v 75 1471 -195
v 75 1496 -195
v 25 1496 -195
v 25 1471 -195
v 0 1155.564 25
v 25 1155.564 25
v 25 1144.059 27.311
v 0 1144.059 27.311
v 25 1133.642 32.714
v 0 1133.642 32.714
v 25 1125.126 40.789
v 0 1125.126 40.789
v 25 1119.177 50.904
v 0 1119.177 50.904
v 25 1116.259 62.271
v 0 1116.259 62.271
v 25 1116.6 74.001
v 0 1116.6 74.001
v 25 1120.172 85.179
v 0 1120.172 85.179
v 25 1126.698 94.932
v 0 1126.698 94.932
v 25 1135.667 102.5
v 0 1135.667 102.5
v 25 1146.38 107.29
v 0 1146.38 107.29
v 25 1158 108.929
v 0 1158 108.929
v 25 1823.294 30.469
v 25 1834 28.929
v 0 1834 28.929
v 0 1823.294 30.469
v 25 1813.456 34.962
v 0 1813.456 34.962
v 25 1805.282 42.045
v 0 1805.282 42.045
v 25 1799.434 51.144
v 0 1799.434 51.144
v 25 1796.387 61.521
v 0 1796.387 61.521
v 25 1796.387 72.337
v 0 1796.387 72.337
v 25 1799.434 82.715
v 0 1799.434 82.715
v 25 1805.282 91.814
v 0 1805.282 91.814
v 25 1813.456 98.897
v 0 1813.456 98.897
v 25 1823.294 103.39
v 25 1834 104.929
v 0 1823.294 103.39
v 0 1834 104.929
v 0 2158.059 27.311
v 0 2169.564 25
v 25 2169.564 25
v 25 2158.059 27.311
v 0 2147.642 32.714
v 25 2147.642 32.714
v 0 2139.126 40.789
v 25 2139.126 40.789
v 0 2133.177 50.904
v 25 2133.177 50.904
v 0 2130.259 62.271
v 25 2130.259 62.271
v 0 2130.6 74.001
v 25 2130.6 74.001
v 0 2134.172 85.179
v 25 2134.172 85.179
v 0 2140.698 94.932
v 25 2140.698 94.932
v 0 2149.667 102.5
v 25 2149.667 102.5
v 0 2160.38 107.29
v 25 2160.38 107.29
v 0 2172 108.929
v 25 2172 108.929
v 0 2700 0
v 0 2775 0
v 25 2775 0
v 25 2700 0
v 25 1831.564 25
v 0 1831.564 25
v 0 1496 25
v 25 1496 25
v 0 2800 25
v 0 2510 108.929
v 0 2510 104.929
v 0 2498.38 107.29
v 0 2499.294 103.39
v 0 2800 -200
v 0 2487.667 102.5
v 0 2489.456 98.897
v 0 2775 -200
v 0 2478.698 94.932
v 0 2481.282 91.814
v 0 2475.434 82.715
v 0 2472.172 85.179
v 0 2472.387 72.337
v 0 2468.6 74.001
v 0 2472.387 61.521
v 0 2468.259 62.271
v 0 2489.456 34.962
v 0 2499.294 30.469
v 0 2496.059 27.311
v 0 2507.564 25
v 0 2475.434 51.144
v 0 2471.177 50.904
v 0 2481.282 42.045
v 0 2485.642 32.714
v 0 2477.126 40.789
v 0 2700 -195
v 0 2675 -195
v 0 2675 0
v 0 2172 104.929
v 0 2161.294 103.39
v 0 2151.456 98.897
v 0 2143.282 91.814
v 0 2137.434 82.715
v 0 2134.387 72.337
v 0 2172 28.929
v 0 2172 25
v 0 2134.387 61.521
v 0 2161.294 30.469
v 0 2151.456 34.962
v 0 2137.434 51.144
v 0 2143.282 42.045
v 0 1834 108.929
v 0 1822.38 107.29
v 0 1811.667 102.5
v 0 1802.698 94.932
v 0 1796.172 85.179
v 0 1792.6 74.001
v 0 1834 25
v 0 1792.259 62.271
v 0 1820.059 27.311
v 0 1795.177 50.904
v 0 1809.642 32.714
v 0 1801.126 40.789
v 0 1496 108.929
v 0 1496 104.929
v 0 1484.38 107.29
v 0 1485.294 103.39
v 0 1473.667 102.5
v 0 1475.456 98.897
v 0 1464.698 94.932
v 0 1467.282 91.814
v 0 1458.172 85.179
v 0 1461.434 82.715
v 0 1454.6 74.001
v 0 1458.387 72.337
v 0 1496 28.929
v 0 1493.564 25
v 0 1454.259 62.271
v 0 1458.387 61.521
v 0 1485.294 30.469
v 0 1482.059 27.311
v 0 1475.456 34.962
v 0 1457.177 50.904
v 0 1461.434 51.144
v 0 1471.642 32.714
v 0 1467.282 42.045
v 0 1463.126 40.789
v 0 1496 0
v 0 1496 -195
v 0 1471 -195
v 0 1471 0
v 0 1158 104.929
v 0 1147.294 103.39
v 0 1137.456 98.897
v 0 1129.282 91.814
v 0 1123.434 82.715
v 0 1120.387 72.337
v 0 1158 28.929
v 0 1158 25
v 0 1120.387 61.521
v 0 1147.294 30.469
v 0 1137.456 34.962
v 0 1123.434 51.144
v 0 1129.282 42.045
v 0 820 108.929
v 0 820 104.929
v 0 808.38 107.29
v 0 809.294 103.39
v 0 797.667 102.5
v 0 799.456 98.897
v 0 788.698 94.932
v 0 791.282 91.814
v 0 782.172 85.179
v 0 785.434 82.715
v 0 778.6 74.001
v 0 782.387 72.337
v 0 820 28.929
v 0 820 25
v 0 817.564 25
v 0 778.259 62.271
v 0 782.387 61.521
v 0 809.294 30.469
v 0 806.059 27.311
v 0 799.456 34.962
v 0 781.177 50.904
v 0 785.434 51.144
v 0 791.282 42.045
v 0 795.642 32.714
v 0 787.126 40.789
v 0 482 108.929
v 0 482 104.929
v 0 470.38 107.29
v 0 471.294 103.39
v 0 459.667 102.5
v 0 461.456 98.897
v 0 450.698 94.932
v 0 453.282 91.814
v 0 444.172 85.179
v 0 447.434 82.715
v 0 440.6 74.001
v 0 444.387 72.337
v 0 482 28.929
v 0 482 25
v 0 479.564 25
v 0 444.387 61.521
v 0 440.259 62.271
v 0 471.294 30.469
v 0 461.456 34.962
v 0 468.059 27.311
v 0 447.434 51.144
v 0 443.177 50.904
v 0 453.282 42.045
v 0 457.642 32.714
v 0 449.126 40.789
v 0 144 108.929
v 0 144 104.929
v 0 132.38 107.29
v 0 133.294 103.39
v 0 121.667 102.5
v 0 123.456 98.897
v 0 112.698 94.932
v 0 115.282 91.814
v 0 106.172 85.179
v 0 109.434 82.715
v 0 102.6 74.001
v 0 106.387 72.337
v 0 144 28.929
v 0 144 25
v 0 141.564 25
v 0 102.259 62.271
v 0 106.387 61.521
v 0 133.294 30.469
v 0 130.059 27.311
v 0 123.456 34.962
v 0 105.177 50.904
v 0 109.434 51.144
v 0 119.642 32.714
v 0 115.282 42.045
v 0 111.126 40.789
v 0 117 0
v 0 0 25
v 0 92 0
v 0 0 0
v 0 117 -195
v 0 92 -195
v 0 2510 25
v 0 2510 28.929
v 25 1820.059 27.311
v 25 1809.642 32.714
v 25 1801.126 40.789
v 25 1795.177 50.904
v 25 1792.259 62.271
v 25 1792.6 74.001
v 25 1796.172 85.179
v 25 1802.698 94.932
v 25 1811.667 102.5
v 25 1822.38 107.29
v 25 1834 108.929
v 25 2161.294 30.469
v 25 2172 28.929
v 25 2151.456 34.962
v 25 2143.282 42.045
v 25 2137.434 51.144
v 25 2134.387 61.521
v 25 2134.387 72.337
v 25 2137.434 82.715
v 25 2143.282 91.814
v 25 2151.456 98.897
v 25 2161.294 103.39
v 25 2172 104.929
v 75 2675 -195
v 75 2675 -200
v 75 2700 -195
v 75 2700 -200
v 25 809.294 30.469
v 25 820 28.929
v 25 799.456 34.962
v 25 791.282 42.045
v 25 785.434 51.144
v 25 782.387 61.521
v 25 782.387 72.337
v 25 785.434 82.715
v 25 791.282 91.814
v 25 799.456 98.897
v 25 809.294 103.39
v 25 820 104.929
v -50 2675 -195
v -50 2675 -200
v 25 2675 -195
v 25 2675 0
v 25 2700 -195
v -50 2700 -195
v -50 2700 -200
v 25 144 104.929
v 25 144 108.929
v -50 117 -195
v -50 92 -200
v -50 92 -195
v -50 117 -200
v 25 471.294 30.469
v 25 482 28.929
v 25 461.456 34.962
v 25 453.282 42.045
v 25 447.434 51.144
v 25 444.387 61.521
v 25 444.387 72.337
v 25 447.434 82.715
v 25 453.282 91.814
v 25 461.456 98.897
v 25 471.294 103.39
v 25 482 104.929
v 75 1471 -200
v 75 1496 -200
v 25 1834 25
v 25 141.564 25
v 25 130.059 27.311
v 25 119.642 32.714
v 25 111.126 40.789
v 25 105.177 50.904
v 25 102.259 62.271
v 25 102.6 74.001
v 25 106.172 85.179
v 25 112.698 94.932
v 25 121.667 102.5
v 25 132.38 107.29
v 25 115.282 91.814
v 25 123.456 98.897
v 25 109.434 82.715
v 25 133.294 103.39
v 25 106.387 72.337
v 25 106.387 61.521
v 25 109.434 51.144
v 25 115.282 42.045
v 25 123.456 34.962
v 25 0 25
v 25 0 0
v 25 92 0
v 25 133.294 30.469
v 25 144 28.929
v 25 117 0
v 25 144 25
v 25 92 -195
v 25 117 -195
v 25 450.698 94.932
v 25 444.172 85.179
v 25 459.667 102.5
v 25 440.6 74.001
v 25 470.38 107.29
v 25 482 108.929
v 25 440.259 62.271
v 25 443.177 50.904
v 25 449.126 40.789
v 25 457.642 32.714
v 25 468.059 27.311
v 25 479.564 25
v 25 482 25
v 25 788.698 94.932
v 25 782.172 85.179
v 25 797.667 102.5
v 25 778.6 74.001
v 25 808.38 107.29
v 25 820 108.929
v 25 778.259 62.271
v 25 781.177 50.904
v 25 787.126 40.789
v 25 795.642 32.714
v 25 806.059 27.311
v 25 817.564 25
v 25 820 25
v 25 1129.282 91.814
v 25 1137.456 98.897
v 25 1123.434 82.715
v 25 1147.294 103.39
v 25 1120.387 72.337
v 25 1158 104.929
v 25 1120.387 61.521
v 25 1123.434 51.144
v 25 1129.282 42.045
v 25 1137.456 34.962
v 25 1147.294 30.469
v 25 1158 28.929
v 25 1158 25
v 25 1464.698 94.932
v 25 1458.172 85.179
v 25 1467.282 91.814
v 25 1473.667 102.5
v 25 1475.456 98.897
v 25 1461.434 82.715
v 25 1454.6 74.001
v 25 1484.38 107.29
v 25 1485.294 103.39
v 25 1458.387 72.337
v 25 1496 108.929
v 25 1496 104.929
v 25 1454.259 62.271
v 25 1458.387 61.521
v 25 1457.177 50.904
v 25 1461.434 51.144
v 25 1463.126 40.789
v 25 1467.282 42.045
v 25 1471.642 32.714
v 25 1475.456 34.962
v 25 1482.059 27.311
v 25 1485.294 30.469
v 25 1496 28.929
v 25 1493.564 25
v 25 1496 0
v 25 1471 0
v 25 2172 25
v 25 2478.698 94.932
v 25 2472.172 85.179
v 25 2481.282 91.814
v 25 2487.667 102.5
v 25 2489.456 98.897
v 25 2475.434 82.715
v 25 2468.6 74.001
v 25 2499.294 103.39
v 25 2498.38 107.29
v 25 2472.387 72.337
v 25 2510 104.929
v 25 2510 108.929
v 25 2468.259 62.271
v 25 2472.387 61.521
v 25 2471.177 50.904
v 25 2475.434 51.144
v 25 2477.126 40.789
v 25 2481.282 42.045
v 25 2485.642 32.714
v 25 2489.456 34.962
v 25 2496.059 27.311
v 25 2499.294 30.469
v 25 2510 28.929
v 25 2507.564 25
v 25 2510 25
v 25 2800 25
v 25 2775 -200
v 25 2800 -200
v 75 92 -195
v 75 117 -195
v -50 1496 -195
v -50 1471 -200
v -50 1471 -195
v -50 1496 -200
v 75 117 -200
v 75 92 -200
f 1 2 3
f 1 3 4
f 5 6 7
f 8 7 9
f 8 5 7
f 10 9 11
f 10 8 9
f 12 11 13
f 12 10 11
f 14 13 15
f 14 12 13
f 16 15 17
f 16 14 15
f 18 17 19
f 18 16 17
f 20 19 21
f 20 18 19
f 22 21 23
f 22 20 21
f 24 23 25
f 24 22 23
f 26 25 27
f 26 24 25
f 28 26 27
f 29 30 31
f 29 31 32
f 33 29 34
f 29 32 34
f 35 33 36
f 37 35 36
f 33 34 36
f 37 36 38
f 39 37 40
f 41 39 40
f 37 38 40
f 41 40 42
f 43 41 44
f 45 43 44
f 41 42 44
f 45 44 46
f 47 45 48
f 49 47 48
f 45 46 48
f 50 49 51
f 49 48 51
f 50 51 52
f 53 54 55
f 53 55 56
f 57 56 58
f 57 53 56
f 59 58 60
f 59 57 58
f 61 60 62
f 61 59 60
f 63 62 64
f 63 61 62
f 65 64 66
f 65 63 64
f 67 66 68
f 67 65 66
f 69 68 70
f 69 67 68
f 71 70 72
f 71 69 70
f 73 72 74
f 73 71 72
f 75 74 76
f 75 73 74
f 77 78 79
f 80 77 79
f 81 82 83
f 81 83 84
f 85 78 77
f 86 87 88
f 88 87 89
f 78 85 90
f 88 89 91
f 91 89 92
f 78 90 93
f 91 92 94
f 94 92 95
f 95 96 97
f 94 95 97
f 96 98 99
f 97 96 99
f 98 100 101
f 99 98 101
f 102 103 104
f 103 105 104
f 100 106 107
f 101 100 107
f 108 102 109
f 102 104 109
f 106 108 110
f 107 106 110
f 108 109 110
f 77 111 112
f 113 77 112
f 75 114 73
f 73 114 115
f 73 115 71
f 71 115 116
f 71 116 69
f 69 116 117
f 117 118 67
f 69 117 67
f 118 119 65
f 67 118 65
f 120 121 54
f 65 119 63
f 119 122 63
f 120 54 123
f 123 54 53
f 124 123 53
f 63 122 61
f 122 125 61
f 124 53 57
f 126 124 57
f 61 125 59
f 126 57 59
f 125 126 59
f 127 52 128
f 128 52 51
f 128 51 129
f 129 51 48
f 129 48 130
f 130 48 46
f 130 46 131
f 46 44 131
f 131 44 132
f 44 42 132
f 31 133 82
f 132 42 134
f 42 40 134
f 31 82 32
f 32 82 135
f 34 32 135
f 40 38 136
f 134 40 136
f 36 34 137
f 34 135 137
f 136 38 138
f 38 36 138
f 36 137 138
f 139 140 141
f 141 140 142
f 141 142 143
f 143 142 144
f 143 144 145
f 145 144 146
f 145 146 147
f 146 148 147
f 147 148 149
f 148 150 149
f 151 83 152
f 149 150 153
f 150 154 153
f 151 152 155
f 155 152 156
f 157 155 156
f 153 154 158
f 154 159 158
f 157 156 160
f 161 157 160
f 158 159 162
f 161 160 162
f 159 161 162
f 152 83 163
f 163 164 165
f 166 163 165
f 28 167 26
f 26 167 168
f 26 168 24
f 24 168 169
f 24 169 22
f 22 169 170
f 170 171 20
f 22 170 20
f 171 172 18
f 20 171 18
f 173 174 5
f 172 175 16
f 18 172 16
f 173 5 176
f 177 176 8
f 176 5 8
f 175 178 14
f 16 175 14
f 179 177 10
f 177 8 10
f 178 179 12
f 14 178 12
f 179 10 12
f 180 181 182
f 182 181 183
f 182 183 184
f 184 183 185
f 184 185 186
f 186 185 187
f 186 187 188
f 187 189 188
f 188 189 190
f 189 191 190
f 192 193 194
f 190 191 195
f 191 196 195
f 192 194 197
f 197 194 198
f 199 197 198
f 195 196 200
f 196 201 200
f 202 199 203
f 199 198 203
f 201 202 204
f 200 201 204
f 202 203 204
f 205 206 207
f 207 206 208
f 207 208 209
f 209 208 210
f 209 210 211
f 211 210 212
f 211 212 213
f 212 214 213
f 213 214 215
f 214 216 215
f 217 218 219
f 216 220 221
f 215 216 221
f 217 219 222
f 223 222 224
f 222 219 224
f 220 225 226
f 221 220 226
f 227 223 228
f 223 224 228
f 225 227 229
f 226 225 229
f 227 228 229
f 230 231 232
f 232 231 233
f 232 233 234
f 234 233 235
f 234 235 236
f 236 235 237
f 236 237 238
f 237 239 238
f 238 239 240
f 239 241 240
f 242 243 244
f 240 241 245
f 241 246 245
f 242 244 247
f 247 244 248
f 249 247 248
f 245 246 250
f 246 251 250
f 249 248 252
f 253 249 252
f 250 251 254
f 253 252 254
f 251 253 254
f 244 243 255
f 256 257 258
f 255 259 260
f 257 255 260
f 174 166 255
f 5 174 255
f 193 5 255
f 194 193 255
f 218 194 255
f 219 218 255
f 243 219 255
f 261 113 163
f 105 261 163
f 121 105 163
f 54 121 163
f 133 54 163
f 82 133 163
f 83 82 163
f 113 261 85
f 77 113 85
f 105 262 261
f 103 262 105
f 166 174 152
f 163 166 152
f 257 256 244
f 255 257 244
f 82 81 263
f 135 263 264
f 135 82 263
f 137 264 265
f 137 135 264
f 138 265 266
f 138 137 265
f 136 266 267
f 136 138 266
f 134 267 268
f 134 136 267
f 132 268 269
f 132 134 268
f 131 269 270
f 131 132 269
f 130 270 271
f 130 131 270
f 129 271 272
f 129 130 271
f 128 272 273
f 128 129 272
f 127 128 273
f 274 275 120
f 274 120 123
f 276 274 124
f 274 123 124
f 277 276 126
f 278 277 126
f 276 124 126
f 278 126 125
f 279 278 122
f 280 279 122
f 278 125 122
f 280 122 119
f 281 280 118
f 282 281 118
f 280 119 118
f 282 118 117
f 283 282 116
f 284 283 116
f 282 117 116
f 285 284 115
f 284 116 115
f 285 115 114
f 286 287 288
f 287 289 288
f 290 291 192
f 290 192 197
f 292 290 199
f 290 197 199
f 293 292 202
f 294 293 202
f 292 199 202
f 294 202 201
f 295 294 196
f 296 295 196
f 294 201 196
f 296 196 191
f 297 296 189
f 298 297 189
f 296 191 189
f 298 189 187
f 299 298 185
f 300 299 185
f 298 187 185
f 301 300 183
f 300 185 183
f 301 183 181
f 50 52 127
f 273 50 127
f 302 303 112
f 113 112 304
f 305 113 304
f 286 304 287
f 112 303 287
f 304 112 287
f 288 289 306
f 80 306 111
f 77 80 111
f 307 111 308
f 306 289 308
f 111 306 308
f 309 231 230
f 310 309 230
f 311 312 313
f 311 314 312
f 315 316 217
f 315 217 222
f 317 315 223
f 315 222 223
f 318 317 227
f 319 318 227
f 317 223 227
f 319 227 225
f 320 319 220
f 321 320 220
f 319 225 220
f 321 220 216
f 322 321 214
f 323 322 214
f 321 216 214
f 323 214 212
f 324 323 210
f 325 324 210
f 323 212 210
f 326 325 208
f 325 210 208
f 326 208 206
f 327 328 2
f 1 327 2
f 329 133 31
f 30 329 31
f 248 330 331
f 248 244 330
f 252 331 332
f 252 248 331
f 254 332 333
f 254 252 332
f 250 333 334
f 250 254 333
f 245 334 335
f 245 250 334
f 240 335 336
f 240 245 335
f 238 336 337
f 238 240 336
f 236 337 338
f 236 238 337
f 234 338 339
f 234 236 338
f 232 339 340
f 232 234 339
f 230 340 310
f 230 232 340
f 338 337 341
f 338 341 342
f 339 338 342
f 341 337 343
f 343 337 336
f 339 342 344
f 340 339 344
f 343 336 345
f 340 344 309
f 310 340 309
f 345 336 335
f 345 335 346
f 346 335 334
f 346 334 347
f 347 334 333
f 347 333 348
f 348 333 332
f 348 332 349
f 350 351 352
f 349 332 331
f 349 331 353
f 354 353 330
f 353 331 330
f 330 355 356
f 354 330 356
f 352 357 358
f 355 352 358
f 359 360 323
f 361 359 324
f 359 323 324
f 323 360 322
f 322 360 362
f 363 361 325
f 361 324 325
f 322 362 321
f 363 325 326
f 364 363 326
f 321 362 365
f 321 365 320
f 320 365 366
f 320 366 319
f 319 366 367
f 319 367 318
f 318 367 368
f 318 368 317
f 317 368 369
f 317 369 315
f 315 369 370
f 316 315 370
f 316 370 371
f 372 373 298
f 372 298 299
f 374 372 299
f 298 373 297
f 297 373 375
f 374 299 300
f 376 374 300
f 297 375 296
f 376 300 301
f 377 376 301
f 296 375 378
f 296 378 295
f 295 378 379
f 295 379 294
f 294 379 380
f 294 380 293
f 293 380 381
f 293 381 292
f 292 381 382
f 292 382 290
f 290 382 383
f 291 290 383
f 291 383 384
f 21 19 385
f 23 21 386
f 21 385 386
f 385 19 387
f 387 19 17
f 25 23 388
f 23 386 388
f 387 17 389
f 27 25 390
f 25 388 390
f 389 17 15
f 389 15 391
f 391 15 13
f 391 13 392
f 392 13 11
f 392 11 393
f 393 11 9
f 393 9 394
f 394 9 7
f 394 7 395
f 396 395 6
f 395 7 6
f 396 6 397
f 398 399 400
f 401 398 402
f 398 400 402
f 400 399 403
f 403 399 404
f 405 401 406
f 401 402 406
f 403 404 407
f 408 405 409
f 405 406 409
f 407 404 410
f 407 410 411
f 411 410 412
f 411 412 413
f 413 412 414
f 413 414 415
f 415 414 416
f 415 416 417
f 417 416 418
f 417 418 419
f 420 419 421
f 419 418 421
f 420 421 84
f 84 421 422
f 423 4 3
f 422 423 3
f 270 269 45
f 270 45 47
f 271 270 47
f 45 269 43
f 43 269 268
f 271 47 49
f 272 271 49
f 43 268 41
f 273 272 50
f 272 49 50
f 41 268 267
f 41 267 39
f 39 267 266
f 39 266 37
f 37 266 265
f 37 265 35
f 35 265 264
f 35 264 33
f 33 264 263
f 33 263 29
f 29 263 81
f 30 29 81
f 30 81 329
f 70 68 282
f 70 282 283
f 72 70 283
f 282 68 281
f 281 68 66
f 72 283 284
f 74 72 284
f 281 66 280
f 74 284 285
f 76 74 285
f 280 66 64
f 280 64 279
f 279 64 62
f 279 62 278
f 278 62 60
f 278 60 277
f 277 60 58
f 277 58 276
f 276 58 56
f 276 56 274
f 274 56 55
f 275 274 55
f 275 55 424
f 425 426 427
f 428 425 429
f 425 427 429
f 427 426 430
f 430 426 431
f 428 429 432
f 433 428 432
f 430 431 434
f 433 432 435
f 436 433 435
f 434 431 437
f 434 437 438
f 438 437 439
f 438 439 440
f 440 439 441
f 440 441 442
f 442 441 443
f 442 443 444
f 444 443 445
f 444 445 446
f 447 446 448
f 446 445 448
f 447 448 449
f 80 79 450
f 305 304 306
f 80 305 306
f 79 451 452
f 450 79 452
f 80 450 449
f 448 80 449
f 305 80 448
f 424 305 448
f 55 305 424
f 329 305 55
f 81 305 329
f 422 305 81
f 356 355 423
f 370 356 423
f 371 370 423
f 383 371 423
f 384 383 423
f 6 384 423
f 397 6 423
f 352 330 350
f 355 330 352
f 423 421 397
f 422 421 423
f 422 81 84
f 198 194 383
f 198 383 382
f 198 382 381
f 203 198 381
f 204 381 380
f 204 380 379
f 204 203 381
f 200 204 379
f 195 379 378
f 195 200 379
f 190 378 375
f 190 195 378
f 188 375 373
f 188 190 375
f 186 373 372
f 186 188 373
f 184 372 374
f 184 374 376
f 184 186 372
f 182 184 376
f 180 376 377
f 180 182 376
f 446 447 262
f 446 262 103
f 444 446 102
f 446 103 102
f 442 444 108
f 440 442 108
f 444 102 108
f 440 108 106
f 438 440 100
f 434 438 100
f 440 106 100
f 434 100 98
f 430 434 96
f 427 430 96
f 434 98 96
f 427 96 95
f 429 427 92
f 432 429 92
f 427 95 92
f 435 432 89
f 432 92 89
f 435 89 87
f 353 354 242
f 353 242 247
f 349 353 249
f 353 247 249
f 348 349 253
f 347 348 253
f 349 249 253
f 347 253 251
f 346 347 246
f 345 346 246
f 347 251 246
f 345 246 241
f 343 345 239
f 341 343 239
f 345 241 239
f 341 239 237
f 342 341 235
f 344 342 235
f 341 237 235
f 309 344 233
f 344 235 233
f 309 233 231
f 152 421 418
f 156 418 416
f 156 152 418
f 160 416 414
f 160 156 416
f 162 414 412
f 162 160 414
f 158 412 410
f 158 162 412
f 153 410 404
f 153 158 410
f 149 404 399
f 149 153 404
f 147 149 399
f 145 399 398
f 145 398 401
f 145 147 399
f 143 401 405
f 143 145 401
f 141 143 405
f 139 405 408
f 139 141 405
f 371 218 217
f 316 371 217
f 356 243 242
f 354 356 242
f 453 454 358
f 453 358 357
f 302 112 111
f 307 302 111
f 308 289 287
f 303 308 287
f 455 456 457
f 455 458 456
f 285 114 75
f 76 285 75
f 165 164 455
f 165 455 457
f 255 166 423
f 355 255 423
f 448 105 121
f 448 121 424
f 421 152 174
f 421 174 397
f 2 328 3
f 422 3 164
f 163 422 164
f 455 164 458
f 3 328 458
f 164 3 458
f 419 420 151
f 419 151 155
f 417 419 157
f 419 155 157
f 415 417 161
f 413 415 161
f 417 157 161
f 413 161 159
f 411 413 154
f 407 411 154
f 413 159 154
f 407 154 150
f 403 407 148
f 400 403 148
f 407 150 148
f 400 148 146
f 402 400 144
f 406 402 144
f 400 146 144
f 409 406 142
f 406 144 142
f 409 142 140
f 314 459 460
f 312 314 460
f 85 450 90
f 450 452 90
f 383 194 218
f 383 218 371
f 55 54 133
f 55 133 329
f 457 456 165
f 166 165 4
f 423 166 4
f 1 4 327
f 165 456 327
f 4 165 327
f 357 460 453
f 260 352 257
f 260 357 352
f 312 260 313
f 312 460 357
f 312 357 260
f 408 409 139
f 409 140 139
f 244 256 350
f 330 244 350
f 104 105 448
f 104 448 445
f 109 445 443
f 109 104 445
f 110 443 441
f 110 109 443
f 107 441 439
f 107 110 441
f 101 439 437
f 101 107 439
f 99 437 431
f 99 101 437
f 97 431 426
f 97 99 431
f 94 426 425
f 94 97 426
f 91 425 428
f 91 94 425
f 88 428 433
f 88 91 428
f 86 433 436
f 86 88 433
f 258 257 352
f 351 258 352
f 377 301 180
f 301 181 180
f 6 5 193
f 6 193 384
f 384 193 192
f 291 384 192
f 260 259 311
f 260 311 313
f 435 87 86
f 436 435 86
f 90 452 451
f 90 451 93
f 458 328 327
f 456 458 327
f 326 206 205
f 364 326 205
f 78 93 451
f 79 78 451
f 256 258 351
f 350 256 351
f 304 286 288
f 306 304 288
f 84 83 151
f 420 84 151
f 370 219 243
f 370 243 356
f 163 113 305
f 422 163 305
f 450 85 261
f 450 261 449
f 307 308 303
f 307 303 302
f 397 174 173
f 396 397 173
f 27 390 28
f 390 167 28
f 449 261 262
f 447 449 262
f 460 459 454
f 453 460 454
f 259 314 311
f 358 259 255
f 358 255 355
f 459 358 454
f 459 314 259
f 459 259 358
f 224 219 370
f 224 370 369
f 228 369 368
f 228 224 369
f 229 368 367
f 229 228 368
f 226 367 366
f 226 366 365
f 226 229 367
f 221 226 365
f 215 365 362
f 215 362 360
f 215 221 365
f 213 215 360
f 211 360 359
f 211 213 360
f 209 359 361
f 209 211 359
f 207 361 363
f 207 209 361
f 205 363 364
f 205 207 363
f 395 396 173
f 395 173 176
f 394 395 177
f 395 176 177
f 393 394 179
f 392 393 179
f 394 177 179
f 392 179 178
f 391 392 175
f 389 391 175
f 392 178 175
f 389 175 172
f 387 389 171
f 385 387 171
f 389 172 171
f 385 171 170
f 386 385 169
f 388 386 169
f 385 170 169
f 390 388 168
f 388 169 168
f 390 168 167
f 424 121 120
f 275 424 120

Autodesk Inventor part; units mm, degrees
ref_plane "YZ Plane" through (0, 0, 0) normal (1, 0, 0) x (0, 1, 0)
ref_plane "XZ Plane" through (0, 0, 0) normal (0, 1, 0) x (-1, 0, 0)
ref_plane "XY Plane" through (0, 0, 0) normal (0, 0, 1) x (1, 0, 0)
sketch "Sketch1" plane through (0, 0, 0) normal (0, 0, 1) x (1, 0, 0)
  line L0 (0, 0) -> (25, 0)
  line L1 (25, 0) -> (25, 2800)
  line L2 (25, 2800) -> (0, 2800)
  line L3 (0, 2800) -> (0, 0)
  dimension "d0" = 25
  dimension "d1" = 2800
extrude "Extrusion1" add sketch "Sketch1" along normal blind 25
sketch "Sketch2" plane through (0, 0, 0) normal (0, 0, -1) x (-1, 0, 0)
  line L0 (-25, 0) -> (-25, 2800) projected
  line L1 (0, 2800) -> (0, 0) projected
  line L2 (-25, 2800) -> (0, 2800)
  line L3 (0, 2800) -> (0, 2775)
  line L4 (0, 2775) -> (-25, 2775)
  line L5 (-25, 2775) -> (-25, 2800)
  dimension "d4" = 25
extrude "Extrusion2" add sketch "Sketch2" along normal blind 200
sketch "Sketch6" plane through (0, 0, 25) normal (-1, 0, 0) x (0, 0, 1)
  line L0 (-225, 2775) -> (-225, 2800) projected
  line L1 (-225, 2675) -> (-220, 2675)
  line L2 (-220, 2675) -> (-220, 2700)
  line L3 (-220, 2700) -> (-225, 2700)
  line L4 (-225, 2700) -> (-225, 2675)
  point P0 (-25, 0)
  dimension "d13" = 5
  dimension "d14" = 25
extrude "Extrusion5" add sketch "Sketch6" along normal blind 50 and the other way blind 75
sketch "Sketch7" plane through (0, 0, 25) normal (-1, 0, 0) x (0, 0, 1)
  line L0 (-225, 1496) -> (-225, 1471) projected
  line L1 (-25, 1471) -> (-225, 1471) projected
  line L2 (-225, 1496) -> (-220, 1496)
  line L3 (-220, 1496) -> (-220, 1471)
  line L4 (-220, 1471) -> (-225, 1471)
  line L5 (-225, 1471) -> (-225, 1496)
  point P0 (-25, 0)
  dimension "d22" = 5
extrude "Extrusion6" add sketch "Sketch7" along normal blind 50 and the other way blind 75
sketch "Sketch8" plane through (0, 0, 25) normal (-1, 0, 0) x (0, 0, 1)
  arc A0 (-0.0707, 2510) -> (83.9293, 2510) centre (41.9293, 2510) ccw
  arc A1 (3.9293, 2510) -> (79.9293, 2510) centre (41.9293, 2510) ccw
  line L0 (-0.0707, 2510) -> (3.9293, 2510)
  line L1 (0, 0) -> (0, 2800) projected
  line L2 (79.9293, 2510) -> (83.9293, 2510)
  line L3 (0, 2800) -> (0, 0) projected
  line L4 (0, 2800) -> (42, 2800)
  point P0 (-25, 0)
  dimension "d31" = 4
  dimension "d39" = 42
  dimension "d40" = 290
extrude "Extrusion7" add sketch "Sketch8" against normal up to surface (25 mm away)
pattern_linear "Rectangular Pattern3" count 8 spacing 338 along (0, -1, 0) of "Extrusion7"
sketch "Sketch10" plane through (0, 2800, -200) normal (-1, 0, 0) x (0, 0, 1)
  line L0 (200, -2800) -> (225, -2800) projected
  line L1 (225, -2800) -> (267, -2800)
  dimension "d41" = 42
sketch "Sketch11" plane through (-50, 2700, -195) normal (0, 0, 1) x (1, 0, 0)
  line L0 (75, 0) -> (50, 0)
  line L1 (50, 0) -> (50, -25)
  line L2 (50, -25) -> (75, -25)
  line L3 (75, -25) -> (75, 0)
  line L4 (75, 0) -> (50, -25) construction
  line L5 (50, 0) -> (75, -25) construction
  line L6 (125, -25) -> (0, -25) projected
  point P0 (50, -2700)
  point P1 (62.5, -12.5)
  dimension "d42" = 25
  dimension "d43" = 25
  dimension "d49" = 0
extrude "Extrusion8" add sketch "Sketch11" along normal up to next
pattern_linear "Rectangular Pattern4" count 2 spacing 1204 along (0, -1, 0) of "Extrusion8"
pattern_linear "Rectangular Pattern5" count 2 spacing 1379 along (0, -1, 0) of "Extrusion6"
sketch "Sketch12" plane through (-50, 117, -195) normal (0, 0, 1) x (1, 0, 0)
  line L0 (50, 0) -> (75, 0)
  line L1 (75, 0) -> (75, -25)
  line L2 (75, -25) -> (50, -25)
  line L3 (50, -25) -> (50, 0)
  line L4 (50, 0) -> (75, -25) construction
  line L5 (75, 0) -> (50, -25) construction
  line L6 (125, -25) -> (0, -25) projected
  point P0 (50, -117)
  point P1 (62.5, -12.5)
  dimension "d53" = 25
  dimension "d54" = 25
  dimension "d55" = 0
extrude "Extrusion9" add sketch "Sketch12" along normal up to next
properties part number "Stand"
